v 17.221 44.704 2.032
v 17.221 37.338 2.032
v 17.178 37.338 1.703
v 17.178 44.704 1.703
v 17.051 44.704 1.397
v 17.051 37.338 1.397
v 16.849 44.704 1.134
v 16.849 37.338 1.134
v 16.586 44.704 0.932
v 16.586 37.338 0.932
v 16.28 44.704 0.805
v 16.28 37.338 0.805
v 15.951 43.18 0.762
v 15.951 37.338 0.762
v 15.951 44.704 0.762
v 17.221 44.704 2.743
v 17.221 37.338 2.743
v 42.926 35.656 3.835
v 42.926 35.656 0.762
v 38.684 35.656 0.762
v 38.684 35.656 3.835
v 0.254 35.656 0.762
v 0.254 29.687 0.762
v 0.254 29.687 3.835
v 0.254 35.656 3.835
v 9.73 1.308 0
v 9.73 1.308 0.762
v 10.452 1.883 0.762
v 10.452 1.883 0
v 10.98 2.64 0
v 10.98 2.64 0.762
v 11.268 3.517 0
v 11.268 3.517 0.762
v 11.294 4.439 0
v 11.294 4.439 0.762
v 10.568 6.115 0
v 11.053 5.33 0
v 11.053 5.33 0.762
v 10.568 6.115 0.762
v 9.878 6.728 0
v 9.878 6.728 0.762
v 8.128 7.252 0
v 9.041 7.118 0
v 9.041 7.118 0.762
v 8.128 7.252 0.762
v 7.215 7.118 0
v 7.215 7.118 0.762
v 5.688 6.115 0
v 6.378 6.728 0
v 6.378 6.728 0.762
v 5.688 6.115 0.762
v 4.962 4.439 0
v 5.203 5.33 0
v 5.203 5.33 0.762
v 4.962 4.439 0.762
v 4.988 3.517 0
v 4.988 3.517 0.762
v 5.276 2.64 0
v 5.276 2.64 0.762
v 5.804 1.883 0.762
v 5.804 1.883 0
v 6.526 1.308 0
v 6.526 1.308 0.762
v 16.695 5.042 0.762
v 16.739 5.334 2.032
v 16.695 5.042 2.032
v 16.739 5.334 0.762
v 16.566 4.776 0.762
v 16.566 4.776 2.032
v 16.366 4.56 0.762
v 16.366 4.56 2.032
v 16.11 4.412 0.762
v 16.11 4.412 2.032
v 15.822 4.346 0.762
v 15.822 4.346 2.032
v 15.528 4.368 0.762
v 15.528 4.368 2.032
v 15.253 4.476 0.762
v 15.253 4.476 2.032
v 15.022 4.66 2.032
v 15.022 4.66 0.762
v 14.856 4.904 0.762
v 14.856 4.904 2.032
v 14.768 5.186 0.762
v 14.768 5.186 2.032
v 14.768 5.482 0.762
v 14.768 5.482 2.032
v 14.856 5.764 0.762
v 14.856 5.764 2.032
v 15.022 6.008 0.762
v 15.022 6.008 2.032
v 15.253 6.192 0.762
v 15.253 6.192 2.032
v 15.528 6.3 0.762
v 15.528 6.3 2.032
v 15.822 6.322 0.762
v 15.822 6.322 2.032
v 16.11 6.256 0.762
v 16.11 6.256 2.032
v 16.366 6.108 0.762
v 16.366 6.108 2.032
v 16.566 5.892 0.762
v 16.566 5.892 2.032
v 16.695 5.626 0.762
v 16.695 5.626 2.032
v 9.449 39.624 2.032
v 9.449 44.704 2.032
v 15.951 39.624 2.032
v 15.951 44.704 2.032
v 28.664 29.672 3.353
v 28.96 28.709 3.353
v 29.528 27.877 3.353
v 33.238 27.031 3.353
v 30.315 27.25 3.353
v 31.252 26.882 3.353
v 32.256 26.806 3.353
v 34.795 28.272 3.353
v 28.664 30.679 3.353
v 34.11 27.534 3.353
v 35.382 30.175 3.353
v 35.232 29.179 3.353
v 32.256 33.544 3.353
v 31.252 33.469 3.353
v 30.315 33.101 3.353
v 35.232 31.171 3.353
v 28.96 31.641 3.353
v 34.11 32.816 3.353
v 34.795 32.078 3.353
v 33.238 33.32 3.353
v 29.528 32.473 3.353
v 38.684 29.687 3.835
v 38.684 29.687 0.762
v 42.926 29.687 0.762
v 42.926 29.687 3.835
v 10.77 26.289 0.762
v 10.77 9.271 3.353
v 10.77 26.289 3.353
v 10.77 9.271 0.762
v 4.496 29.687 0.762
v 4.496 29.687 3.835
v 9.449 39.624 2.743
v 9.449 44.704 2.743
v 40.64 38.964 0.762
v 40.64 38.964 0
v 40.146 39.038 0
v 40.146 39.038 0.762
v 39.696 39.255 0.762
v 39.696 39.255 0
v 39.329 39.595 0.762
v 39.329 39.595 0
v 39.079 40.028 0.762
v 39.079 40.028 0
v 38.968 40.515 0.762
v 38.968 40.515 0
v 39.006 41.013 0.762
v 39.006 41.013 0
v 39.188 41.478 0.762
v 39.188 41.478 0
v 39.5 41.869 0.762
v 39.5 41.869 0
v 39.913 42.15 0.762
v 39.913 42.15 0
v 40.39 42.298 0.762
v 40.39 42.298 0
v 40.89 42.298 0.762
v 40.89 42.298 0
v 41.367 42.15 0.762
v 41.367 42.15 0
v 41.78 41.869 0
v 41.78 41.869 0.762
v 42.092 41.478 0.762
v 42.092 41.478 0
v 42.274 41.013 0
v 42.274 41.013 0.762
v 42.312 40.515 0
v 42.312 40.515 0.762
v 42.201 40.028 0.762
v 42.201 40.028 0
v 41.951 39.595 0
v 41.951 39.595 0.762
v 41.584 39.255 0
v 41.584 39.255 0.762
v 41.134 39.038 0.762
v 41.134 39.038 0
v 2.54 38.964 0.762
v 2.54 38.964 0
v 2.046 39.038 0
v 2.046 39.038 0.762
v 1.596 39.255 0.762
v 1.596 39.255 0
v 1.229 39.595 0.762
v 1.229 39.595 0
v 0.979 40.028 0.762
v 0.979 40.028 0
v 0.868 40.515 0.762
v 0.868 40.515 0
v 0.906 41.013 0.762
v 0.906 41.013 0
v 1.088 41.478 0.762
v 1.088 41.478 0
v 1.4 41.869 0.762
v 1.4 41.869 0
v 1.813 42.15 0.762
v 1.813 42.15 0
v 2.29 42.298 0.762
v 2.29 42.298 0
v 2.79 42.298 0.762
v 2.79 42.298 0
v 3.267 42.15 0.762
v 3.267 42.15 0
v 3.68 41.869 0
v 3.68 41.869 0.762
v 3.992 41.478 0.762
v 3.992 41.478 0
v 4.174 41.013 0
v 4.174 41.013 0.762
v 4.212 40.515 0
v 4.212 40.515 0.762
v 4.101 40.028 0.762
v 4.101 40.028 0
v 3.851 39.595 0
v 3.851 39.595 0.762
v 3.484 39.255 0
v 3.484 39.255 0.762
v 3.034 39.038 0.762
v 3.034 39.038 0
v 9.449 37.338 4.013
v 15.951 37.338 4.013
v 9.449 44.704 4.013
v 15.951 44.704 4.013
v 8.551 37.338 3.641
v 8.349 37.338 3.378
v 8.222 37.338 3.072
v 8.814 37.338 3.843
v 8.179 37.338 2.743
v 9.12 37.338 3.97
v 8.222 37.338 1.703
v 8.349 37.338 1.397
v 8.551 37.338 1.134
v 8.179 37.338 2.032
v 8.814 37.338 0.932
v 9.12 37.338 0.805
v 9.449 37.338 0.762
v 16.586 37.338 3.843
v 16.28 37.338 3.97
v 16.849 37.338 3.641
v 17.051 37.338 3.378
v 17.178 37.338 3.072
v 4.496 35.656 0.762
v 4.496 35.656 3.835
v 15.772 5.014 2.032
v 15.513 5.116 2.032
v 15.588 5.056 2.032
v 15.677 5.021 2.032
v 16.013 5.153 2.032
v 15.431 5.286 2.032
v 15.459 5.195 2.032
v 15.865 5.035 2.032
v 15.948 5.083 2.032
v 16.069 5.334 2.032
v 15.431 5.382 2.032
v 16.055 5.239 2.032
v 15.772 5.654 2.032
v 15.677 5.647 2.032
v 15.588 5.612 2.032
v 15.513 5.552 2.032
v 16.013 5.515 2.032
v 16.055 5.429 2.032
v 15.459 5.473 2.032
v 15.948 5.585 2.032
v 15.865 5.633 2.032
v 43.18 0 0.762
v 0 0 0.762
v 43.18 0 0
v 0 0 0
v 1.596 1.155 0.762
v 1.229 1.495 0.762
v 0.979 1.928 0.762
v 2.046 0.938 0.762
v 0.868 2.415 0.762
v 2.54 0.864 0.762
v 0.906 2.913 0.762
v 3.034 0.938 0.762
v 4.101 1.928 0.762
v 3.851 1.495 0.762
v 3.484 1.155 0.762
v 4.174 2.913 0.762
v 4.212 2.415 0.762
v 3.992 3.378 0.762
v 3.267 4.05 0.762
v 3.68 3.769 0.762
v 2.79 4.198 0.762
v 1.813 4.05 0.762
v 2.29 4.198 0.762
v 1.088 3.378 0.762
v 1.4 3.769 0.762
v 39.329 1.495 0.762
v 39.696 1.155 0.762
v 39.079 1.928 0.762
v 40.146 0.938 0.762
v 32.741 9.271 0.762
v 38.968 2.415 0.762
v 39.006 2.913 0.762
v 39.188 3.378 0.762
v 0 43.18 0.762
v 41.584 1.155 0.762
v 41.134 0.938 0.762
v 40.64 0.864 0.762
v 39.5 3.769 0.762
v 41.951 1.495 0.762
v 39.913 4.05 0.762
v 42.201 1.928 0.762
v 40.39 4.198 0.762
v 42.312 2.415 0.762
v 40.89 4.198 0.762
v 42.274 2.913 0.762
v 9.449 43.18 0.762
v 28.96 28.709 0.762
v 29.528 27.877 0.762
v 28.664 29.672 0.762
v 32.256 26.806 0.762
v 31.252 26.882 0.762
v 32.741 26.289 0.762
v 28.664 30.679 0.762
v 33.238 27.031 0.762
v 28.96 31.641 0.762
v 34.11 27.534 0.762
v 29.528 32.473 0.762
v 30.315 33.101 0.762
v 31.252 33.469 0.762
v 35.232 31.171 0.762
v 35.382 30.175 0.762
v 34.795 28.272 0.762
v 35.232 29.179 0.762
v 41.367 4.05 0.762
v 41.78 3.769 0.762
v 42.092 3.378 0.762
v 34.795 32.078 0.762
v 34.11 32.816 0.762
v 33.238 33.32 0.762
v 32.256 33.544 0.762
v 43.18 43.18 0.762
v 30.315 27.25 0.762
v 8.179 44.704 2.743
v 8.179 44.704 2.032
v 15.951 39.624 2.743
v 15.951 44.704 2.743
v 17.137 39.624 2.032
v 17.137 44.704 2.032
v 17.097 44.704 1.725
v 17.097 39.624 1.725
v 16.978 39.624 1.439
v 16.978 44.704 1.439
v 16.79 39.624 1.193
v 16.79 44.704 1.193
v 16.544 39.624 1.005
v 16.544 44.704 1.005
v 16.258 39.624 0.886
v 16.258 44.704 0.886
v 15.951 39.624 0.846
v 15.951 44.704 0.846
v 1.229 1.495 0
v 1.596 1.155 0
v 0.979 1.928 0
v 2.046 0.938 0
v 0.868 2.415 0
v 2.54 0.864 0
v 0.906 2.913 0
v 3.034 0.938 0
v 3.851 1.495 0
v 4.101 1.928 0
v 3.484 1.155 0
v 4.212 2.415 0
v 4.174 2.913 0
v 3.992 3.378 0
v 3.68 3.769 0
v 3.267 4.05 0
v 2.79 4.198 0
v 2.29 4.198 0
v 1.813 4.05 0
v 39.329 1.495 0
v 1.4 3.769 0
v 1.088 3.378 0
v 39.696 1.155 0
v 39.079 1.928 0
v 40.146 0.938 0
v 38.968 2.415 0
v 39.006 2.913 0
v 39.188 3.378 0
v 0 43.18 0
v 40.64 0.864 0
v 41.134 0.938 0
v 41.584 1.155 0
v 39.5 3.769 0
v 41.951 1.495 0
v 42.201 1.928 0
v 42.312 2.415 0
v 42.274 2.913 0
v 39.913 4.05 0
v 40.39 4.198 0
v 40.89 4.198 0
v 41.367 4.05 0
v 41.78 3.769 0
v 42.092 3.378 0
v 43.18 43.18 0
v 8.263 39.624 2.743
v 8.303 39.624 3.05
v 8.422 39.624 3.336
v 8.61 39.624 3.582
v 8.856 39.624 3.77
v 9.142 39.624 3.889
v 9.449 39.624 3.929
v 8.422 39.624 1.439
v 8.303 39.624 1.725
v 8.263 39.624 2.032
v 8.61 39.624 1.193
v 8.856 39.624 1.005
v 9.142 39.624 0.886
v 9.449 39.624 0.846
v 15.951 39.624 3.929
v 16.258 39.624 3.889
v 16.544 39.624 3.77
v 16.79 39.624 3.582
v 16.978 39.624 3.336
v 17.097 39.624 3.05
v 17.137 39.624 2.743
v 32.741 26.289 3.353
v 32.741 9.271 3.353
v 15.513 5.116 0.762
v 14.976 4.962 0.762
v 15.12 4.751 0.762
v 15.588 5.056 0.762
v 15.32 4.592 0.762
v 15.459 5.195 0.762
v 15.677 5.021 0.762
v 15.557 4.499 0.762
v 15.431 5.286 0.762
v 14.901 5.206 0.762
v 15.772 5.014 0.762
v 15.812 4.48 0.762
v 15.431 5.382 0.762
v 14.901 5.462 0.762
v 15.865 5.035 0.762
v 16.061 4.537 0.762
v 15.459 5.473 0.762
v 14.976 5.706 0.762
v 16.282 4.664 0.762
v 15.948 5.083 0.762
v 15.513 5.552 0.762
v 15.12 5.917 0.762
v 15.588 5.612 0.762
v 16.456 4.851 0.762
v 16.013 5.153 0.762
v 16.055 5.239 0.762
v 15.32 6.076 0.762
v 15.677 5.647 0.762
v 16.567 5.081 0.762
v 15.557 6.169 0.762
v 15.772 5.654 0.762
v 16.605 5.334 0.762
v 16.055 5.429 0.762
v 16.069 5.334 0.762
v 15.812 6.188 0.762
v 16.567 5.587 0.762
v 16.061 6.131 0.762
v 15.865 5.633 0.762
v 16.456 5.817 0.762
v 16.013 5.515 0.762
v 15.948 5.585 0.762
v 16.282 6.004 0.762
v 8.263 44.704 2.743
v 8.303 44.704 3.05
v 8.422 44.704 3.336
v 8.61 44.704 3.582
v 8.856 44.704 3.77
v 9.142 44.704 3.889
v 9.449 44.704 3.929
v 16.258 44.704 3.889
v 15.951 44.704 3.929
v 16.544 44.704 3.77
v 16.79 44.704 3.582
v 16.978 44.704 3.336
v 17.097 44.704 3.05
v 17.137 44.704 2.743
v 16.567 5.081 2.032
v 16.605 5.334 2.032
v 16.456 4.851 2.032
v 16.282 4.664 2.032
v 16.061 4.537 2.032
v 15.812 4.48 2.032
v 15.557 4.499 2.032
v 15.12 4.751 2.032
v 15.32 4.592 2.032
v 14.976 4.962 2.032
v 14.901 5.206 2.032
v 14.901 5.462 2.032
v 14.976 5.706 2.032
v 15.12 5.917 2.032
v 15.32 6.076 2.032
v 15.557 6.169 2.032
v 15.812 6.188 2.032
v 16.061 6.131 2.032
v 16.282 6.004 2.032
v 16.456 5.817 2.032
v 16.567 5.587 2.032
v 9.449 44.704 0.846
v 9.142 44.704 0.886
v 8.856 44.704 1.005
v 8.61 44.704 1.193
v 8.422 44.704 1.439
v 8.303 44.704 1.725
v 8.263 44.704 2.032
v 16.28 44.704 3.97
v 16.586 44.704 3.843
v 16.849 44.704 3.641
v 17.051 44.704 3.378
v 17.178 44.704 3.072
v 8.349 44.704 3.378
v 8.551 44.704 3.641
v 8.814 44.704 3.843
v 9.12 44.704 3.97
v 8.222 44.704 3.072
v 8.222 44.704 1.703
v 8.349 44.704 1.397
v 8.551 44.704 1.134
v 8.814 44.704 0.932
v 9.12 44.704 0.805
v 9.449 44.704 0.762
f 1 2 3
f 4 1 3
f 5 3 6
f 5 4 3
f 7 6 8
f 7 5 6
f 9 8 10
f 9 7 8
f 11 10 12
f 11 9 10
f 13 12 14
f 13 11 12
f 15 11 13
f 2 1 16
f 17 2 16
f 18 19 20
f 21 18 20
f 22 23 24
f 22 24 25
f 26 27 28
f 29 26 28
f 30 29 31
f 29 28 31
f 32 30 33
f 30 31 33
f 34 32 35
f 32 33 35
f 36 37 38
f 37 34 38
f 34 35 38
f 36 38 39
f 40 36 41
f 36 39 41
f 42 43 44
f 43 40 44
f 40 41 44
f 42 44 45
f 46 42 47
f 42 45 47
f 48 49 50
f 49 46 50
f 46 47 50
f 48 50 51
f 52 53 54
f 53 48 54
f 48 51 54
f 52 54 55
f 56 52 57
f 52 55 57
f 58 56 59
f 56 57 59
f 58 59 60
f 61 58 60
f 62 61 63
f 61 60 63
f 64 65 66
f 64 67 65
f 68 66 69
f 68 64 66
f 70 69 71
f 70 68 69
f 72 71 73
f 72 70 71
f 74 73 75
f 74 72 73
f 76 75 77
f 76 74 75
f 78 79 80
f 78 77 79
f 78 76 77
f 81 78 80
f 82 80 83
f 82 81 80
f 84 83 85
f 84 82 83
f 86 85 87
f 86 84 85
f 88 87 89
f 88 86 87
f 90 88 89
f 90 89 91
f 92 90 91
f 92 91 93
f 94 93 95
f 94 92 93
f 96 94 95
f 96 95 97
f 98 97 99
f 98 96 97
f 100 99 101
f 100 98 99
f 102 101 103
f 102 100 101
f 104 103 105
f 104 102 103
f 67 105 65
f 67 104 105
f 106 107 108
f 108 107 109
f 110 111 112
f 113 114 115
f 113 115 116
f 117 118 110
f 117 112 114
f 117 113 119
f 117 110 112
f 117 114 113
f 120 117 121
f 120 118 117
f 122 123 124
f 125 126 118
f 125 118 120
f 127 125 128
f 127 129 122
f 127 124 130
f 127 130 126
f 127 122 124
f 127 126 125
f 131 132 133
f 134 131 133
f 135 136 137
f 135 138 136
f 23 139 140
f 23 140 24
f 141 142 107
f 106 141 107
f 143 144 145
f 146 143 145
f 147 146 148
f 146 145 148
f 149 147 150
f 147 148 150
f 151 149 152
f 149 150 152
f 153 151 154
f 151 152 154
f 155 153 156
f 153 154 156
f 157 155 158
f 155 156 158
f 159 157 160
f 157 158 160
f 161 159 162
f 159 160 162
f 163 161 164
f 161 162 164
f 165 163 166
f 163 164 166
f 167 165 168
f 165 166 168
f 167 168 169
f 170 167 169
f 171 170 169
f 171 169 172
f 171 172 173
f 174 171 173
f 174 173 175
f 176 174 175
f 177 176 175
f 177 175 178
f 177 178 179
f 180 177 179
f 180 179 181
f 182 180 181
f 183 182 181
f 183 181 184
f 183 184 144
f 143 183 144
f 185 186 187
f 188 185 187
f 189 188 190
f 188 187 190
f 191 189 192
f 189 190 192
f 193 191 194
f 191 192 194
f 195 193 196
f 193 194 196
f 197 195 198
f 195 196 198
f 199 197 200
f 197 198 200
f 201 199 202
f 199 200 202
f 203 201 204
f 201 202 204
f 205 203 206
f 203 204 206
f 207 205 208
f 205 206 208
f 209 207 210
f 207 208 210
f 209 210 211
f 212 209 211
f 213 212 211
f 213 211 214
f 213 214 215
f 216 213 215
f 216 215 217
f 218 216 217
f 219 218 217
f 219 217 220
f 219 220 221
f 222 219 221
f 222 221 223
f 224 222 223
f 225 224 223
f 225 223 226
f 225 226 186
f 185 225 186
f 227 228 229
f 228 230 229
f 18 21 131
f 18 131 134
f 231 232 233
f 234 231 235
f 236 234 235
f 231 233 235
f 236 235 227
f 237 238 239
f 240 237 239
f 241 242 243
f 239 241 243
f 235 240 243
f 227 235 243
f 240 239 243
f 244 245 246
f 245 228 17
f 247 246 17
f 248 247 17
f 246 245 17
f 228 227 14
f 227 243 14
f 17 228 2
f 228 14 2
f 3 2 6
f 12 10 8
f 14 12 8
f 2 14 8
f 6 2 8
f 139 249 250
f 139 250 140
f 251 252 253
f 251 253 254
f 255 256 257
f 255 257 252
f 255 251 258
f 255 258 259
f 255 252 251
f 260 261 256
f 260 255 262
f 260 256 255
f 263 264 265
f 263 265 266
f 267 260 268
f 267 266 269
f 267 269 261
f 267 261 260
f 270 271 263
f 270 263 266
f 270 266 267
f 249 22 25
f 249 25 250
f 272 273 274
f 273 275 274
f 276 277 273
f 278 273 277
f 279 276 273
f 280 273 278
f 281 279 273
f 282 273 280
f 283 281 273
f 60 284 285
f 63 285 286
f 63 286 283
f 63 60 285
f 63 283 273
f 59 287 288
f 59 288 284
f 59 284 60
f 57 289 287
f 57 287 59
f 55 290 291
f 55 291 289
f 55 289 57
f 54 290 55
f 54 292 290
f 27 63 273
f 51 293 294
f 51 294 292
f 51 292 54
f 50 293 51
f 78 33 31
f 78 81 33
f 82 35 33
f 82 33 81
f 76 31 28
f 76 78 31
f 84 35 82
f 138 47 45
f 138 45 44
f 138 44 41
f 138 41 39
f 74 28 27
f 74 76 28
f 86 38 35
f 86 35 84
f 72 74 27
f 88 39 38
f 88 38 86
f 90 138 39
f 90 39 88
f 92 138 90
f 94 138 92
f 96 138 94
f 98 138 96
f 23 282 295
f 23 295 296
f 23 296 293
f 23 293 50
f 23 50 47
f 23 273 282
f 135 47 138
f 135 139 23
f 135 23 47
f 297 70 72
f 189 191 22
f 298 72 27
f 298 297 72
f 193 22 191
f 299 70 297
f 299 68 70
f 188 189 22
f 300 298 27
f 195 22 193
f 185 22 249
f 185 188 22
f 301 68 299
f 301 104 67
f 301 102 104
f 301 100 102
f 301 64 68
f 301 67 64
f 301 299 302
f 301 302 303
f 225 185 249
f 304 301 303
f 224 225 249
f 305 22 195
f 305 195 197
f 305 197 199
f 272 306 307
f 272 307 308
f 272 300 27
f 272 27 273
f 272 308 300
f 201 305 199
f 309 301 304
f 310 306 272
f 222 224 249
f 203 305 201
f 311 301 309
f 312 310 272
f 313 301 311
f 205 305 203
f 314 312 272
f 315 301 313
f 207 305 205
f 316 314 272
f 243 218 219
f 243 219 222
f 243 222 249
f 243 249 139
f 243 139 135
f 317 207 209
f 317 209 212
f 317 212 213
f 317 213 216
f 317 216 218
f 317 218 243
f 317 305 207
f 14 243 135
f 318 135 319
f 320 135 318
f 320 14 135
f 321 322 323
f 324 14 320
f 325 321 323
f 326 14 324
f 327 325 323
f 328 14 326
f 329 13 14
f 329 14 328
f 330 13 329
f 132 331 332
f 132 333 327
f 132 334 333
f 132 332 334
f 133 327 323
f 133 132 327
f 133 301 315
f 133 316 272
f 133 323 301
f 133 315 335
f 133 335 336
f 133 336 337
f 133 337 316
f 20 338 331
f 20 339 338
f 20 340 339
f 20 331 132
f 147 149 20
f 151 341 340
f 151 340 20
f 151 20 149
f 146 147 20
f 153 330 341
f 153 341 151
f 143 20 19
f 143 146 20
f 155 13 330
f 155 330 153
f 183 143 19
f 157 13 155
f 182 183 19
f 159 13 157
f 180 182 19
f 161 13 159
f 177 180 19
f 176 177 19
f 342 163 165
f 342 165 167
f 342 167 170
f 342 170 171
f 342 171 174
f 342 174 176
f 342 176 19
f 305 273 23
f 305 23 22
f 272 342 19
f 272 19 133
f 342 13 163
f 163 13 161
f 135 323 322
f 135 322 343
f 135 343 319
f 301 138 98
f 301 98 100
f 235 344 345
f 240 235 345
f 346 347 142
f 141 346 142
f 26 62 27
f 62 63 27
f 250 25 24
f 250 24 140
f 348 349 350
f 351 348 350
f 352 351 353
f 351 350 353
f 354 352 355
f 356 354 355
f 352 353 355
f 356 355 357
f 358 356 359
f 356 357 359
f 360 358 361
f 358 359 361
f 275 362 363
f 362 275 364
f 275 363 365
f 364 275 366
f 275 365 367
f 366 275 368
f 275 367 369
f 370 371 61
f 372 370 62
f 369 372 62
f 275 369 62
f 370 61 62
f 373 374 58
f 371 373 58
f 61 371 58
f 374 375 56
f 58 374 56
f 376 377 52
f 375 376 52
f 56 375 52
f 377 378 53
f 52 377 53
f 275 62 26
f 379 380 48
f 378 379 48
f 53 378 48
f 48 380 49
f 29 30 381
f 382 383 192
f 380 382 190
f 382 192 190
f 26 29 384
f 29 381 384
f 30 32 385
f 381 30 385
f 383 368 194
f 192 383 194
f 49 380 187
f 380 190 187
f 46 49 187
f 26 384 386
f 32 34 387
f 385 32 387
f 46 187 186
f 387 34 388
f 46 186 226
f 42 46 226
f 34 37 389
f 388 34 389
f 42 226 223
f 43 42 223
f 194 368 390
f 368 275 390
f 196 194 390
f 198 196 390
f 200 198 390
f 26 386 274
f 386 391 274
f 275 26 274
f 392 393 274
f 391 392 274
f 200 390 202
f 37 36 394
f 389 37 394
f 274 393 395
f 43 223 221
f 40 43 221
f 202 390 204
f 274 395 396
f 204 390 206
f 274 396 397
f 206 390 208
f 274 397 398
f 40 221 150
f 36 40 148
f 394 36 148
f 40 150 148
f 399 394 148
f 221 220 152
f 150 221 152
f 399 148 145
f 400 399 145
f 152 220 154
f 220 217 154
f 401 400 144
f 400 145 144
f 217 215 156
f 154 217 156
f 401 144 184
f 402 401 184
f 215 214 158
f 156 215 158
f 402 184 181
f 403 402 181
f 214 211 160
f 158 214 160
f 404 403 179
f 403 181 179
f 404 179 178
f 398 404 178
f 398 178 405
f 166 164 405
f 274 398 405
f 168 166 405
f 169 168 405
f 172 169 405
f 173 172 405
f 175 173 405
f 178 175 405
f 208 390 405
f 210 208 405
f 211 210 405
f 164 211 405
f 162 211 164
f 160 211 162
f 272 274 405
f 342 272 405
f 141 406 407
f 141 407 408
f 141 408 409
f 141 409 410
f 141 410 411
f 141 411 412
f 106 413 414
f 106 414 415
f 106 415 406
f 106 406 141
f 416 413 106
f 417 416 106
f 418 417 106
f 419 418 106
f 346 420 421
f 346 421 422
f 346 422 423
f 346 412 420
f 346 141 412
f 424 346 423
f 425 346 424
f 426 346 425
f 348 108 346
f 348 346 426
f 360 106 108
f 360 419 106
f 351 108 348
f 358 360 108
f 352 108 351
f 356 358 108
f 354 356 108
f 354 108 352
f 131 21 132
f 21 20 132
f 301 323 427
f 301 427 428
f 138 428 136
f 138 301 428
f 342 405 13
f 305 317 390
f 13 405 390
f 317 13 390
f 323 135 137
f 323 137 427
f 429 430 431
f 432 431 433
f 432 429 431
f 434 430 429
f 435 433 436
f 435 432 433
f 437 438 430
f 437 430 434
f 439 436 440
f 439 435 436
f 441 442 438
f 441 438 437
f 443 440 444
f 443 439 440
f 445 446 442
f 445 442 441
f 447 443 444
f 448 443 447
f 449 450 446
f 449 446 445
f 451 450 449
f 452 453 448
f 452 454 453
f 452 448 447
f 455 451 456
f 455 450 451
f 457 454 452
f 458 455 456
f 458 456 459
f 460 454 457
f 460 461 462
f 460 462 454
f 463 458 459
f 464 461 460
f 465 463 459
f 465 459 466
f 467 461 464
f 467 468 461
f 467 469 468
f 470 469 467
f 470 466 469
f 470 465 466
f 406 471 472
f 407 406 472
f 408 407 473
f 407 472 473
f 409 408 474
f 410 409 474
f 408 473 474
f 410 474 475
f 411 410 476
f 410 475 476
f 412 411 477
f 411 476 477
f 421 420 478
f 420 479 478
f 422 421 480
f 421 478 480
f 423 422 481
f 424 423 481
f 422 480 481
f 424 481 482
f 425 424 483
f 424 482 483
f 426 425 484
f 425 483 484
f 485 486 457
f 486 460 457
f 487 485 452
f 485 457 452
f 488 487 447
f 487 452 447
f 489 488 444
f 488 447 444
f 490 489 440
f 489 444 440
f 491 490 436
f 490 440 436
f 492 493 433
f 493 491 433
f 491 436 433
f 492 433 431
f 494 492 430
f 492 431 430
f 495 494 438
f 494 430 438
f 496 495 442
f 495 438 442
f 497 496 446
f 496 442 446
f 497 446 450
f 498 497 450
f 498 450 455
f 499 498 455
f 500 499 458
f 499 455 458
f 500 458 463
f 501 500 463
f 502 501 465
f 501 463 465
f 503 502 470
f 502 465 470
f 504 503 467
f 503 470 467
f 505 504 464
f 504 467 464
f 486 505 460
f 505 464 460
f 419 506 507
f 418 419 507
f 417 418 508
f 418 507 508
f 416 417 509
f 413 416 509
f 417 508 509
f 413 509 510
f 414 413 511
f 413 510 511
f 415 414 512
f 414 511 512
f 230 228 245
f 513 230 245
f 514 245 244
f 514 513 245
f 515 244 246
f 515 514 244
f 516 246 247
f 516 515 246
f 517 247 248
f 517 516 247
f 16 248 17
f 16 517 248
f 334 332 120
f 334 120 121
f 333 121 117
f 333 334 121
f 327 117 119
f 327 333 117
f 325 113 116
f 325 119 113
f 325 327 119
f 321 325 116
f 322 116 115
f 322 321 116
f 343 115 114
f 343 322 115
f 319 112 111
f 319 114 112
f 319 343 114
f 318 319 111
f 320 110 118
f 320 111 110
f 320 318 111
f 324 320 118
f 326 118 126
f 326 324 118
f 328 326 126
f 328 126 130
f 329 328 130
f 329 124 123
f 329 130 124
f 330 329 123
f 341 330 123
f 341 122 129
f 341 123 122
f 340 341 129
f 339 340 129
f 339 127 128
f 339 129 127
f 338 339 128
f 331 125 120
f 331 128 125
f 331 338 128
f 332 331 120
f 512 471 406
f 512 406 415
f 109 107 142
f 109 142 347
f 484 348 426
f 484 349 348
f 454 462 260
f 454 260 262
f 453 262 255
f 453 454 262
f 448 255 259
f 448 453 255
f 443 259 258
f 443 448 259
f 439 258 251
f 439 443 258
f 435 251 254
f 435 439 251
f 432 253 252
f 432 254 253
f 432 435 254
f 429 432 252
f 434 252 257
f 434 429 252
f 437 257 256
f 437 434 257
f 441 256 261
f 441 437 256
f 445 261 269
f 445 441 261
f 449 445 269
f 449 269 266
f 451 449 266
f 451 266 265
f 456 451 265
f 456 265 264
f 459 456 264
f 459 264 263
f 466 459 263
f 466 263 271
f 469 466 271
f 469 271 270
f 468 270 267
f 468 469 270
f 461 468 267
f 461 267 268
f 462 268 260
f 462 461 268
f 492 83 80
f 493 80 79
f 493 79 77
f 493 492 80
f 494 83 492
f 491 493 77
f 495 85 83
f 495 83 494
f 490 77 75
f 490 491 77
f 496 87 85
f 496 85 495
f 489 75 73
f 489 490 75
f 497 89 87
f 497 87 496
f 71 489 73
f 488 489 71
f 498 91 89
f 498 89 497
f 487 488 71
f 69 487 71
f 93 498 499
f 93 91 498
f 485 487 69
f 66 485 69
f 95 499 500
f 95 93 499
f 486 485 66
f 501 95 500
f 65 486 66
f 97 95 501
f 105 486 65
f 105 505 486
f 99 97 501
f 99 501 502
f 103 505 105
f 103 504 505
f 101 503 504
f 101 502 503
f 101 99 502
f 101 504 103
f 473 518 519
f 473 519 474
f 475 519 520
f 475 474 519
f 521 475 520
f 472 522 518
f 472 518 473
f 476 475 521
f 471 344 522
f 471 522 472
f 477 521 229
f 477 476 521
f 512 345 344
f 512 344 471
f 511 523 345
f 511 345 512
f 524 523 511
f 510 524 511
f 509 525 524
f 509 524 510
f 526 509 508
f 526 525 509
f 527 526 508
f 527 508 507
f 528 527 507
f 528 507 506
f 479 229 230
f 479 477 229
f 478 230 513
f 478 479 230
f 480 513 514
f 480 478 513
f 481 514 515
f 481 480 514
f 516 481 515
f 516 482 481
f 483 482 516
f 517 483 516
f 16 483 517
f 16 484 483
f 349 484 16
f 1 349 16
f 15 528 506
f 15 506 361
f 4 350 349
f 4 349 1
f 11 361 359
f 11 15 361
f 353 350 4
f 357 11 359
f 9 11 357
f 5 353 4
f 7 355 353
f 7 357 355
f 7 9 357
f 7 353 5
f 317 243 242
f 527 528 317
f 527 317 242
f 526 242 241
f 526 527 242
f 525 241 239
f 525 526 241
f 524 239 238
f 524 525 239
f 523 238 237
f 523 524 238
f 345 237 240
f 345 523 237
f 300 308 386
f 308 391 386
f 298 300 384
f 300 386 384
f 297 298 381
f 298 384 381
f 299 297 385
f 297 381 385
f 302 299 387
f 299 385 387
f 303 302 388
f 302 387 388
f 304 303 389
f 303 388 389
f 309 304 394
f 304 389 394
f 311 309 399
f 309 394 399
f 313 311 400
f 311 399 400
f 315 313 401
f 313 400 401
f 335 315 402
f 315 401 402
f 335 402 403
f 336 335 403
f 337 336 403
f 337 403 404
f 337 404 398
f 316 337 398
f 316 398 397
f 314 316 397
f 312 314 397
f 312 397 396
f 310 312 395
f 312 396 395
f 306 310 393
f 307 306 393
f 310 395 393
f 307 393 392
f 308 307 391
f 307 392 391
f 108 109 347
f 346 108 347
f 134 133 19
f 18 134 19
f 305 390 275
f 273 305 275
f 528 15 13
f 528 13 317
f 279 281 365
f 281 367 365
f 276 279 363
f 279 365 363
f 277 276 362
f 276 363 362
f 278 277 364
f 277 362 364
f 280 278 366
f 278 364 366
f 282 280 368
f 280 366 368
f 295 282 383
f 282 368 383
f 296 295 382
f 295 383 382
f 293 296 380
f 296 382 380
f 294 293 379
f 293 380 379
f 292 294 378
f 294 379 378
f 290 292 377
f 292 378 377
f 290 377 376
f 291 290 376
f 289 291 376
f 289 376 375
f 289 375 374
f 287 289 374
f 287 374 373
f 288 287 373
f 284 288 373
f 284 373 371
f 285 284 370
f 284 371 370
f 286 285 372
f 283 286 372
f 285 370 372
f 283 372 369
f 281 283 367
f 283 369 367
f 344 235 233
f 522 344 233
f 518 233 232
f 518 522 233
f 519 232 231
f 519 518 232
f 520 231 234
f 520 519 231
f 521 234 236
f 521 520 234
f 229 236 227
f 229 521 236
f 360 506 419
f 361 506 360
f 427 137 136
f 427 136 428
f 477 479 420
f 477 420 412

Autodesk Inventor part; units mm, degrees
ref_plane "YZ Plane" through (0, 0, 0) normal (1, 0, 0) x (0, 1, 0)
ref_plane "XZ Plane" through (0, 0, 0) normal (0, 1, 0) x (-1, 0, 0)
sketch "Sketch1" plane through (0, 0, 0) normal (0, 0, 1) x (1, 0, 0)
  line L0 (0, 0) -> (43.18, 0)
  line L1 (43.18, 0) -> (43.18, 43.18)
  line L2 (43.18, 43.18) -> (0, 43.18)
  line L3 (0, 43.18) -> (0, 0)
  dimension "d0" = 43.18
  dimension "d1" = 43.18
extrude "Extrusion1" add sketch "Sketch1" along normal blind 0.762
sketch "Sketch2" plane through (0, 0, 0.762) normal (0, 0, 1) x (1, 0, 0)
  line L0 (0, 0) -> (43.18, 0) projected
  line L1 (43.18, 0) -> (43.18, 43.18) projected
  line L2 (43.18, 43.18) -> (0, 43.18) projected
  line L3 (0, 43.18) -> (0, 0) projected
  line L4 (2.54, 40.64) -> (40.64, 40.64)
  line L5 (40.64, 40.64) -> (40.64, 2.54)
  line L6 (40.64, 2.54) -> (2.54, 2.54)
  line L7 (2.54, 2.54) -> (2.54, 40.64)
  dimension "d4" = 2.54
hole "Hole1" at (2.54, 40.64, 0.762) at (2.54, 2.54, 0.762) at (40.64, 2.54, 0.762) at (40.64, 40.64, 0.762) direction (0, 0, -1) diameter 3.3528 depth 25.4 tip angle 118
ref_plane "Work Plane1" through (0, 44.704, 0) normal (0, 1, 0) x (1, 0, 0)
sketch "Sketch3" plane through (0, 44.704, 0) normal (0, 1, 0) x (1, 0, 0)
  line L0 (43.18, -0.762) -> (0, -0.762) projected
  line L1 (9.4488, -0.762) -> (15.9512, -0.762)
  line L2 (17.2212, -2.032) -> (17.2212, -2.7432)
  line L3 (15.9512, -4.0132) -> (9.4488, -4.0132)
  line L4 (8.1788, -2.7432) -> (8.1788, -2.032)
  line L5 (0, 0) -> (0, -0.762) projected
  arc A0 (9.4488, -0.762) -> (8.1788, -2.032) centre (9.4488, -2.032) ccw
  arc A1 (17.2212, -2.032) -> (15.9512, -0.762) centre (15.9512, -2.032) ccw
  arc A2 (15.9512, -4.0132) -> (17.2212, -2.7432) centre (15.9512, -2.7432) ccw
  arc A3 (8.1788, -2.7432) -> (9.4488, -4.0132) centre (9.4488, -2.7432) ccw
  line L6 (0, -0.762) -> (43.18, -0.762) projected
  line L7 (12.827, -0.762) -> (12.827, 2.5763)
  line L8 (12.7, -4.0132) -> (12.7, -2.4751)
  point P0 (8.1788, -0.762)
  point P1 (17.2212, -4.0132)
  point P2 (17.2212, -0.762)
  point P3 (8.1788, -4.0132)
  dimension "d13" = 9.0424
  dimension "d14" = 3.2512
  dimension "d15" = 8.1788
  dimension "d16" = 1.27
extrude "Extrusion2" add sketch "Sketch3" against normal blind 7.366
sketch "Sketch4" plane through (0, 44.704, 0) normal (0, 1, 0) x (1, 0, 0)
  line L0 (9.4488, -0.762) -> (15.9512, -0.762) projected
  arc A0 (9.4488, -0.762) -> (8.1788, -2.032) centre (9.4488, -2.032) ccw projected
  line L1 (8.1788, -2.7432) -> (8.1788, -2.032) projected
  arc A1 (8.1788, -2.7432) -> (9.4488, -4.0132) centre (9.4488, -2.7432) ccw projected
  line L2 (15.9512, -4.0132) -> (9.4488, -4.0132) projected
  arc A2 (15.9512, -4.0132) -> (17.2212, -2.7432) centre (15.9512, -2.7432) ccw projected
  line L3 (17.2212, -2.032) -> (17.2212, -2.7432) projected
  arc A3 (17.2212, -2.032) -> (15.9512, -0.762) centre (15.9512, -2.032) ccw projected
  line L4 (9.4488, -2.032) -> (15.9512, -2.032)
  line L5 (15.9512, -2.032) -> (15.9512, -2.7432)
  line L6 (15.9512, -2.7432) -> (9.4488, -2.7432)
  line L7 (9.4488, -2.7432) -> (9.4488, -2.032)
  arc A4 (9.4488, -0.8459) -> (8.2627, -2.032) centre (9.4488, -2.032) ccw
  line L8 (9.4488, -0.8459) -> (15.9512, -0.8459)
  arc A5 (17.1373, -2.032) -> (15.9512, -0.8459) centre (15.9512, -2.032) ccw
  line L9 (17.1373, -2.032) -> (17.1373, -2.7432)
  arc A6 (15.9512, -3.9293) -> (17.1373, -2.7432) centre (15.9512, -2.7432) ccw
  line L10 (15.9512, -3.9293) -> (9.4488, -3.9293)
  arc A7 (8.2627, -2.7432) -> (9.4488, -3.9293) centre (9.4488, -2.7432) ccw
  line L11 (8.2627, -2.7432) -> (8.2627, -2.032)
  point P0 (0, 0)
extrude "Extrusion3" cut sketch "Sketch4" against normal blind 5.08 contours L8 A5 L9 A6 L10 A7 L11 A4
sketch "Sketch5" plane through (0, 0, 0.762) normal (0, 0, 1) x (1, 0, 0)
  line L0 (9.4488, 43.18) -> (9.4488, 37.338) projected
  line L1 (9.4488, 43.18) -> (0, 43.18) projected
  line L2 (0, 43.18) -> (0, 0) projected
  line L3 (0, 0) -> (43.18, 0) projected
  line L4 (43.18, 0) -> (43.18, 43.18) projected
  line L5 (43.18, 43.18) -> (15.9512, 43.18) projected
  line L6 (15.9512, 43.18) -> (15.9512, 37.338) projected
  line L7 (15.9512, 37.338) -> (9.4488, 37.338) projected
  circle A0 centre (40.64, 2.54) radius 1.6764 projected
  circle A1 centre (2.54, 40.64) radius 1.6764 projected
  circle A2 centre (2.54, 2.54) radius 1.6764 projected
  circle A3 centre (40.64, 40.64) radius 1.6764 projected
  line L8 (0, 0) -> (43.18, 0) projected
  line L9 (21.59, 0) -> (21.59, 11.5828)
  line L10 (0.254, 35.6558) -> (4.4958, 35.6558)
  line L11 (4.4958, 35.6558) -> (4.4958, 29.6868)
  line L12 (4.4958, 29.6868) -> (0.254, 29.6868)
  line L13 (0.254, 29.6868) -> (0.254, 35.6558)
  line L14 (42.926, 35.6558) -> (38.6842, 35.6558)
  line L15 (38.6842, 35.6558) -> (38.6842, 29.6868)
  line L16 (38.6842, 29.6868) -> (42.926, 29.6868)
  line L17 (42.926, 29.6868) -> (42.926, 35.6558)
  dimension "d21" = 4.2418
  dimension "d22" = 5.969
  dimension "d23" = 0.254
extrude "Extrusion4" add sketch "Sketch5" along normal blind 3.0734 contours L10 L11 L12 L13 | L17 L16 L15 L14
sketch "Sketch6" plane through (0, 0, 0.762) normal (0, 0, 1) x (1, 0, 0)
  circle A0 centre (8.128, 4.064) radius 3.1877
  line L0 (0, 43.18) -> (0, 0) projected
  line L1 (0, 0) -> (43.18, 0) projected
  line L2 (6.526, 1.3081) -> (9.73, 1.3081)
  line L3 (8.128, 7.2517) -> (14.0521, 7.2517)
  dimension "d26" = 6.3754
  dimension "d27" = 8.128
  dimension "d28" = 4.064
  dimension "d29" = 5.9436
extrude "Extrusion5" cut sketch "Sketch6" against normal through all contours A0 L2 picked at (8.128, 3.2893)
sketch "Sketch7" plane through (0, 0, 0.762) normal (0, 0, 1) x (1, 0, 0)
  line L0 (10.7696, 26.289) -> (32.7406, 26.289)
  line L1 (32.7406, 26.289) -> (32.7406, 9.271)
  line L2 (32.7406, 9.271) -> (10.7696, 9.271)
  line L3 (10.7696, 9.271) -> (10.7696, 26.289)
  line L4 (0, 0) -> (43.18, 0) projected
  line L5 (0, 43.18) -> (0, 0) projected
  dimension "d32" = 21.971
  dimension "d33" = 17.018
  dimension "d34" = 9.271
  dimension "d35" = 10.7696
extrude "Extrusion6" add sketch "Sketch7" along normal blind 2.5908
sketch "Sketch8" plane through (0, 0, 0.762) normal (0, 0, 1) x (1, 0, 0)
  circle A0 centre (32.004, 30.1752) radius 3.3782
  line L0 (43.18, 43.18) -> (15.9512, 43.18) projected
  line L1 (43.18, 0) -> (43.18, 43.18) projected
  point P0 (0, 0)
  dimension "d38" = 6.7564
  dimension "d39" = 13.0048
  dimension "d40" = 11.176
extrude "Extrusion7" add sketch "Sketch8" along normal blind 2.5908
sketch "Sketch9" plane through (0, 0, 0.762) normal (0, 0, 1) x (1, 0, 0)
  circle A0 centre (15.748, 5.334) radius 0.9906
  circle A1 centre (15.748, 5.334) radius 0.8567
  circle A2 centre (15.748, 5.334) radius 0.3208
  line L0 (0, 43.18) -> (0, 0) projected
  line L1 (0, 0) -> (43.18, 0) projected
  dimension "d43" = 1.9812
  dimension "d44" = 15.748
  dimension "d45" = 5.334
extrude "Extrusion8" add sketch "Sketch9" along normal blind 1.27
sketch "Sketch10" plane through (9.4488, 44.704, 4.0132) normal (0, 0, 1) x (1, 0, 0)
  line L0 (-9.4517, -1.8915) -> (33.7316, -1.8915) construction
  line L1 (33.7316, -1.8915) -> (33.7316, -44.7034) construction
  line L2 (33.7316, -44.7034) -> (-9.4517, -44.7034) construction
  line L3 (-9.4517, -44.7034) -> (-9.4517, -1.8915) construction
  point P0 (-9.4488, -44.704)
decal "Decal1"
sketch "Sketch11" plane through (0, 0, 3.3528) normal (0, 0, 1) x (1, 0, 0)
  line L0 (0.004, 42.7411) -> (43.1873, 42.7411) construction
  line L1 (43.1873, 42.7411) -> (43.1873, -0.0708) construction
  line L2 (43.1873, -0.0708) -> (0.004, -0.0708) construction
  line L3 (0.004, -0.0708) -> (0.004, 42.7411) construction
  point P0 (0, 0)
  point P1 (-9.4488, -44.704)
decal "Decal2"
properties part number "SparkFun GPS-RTK2 Board - ZED-F9P"
